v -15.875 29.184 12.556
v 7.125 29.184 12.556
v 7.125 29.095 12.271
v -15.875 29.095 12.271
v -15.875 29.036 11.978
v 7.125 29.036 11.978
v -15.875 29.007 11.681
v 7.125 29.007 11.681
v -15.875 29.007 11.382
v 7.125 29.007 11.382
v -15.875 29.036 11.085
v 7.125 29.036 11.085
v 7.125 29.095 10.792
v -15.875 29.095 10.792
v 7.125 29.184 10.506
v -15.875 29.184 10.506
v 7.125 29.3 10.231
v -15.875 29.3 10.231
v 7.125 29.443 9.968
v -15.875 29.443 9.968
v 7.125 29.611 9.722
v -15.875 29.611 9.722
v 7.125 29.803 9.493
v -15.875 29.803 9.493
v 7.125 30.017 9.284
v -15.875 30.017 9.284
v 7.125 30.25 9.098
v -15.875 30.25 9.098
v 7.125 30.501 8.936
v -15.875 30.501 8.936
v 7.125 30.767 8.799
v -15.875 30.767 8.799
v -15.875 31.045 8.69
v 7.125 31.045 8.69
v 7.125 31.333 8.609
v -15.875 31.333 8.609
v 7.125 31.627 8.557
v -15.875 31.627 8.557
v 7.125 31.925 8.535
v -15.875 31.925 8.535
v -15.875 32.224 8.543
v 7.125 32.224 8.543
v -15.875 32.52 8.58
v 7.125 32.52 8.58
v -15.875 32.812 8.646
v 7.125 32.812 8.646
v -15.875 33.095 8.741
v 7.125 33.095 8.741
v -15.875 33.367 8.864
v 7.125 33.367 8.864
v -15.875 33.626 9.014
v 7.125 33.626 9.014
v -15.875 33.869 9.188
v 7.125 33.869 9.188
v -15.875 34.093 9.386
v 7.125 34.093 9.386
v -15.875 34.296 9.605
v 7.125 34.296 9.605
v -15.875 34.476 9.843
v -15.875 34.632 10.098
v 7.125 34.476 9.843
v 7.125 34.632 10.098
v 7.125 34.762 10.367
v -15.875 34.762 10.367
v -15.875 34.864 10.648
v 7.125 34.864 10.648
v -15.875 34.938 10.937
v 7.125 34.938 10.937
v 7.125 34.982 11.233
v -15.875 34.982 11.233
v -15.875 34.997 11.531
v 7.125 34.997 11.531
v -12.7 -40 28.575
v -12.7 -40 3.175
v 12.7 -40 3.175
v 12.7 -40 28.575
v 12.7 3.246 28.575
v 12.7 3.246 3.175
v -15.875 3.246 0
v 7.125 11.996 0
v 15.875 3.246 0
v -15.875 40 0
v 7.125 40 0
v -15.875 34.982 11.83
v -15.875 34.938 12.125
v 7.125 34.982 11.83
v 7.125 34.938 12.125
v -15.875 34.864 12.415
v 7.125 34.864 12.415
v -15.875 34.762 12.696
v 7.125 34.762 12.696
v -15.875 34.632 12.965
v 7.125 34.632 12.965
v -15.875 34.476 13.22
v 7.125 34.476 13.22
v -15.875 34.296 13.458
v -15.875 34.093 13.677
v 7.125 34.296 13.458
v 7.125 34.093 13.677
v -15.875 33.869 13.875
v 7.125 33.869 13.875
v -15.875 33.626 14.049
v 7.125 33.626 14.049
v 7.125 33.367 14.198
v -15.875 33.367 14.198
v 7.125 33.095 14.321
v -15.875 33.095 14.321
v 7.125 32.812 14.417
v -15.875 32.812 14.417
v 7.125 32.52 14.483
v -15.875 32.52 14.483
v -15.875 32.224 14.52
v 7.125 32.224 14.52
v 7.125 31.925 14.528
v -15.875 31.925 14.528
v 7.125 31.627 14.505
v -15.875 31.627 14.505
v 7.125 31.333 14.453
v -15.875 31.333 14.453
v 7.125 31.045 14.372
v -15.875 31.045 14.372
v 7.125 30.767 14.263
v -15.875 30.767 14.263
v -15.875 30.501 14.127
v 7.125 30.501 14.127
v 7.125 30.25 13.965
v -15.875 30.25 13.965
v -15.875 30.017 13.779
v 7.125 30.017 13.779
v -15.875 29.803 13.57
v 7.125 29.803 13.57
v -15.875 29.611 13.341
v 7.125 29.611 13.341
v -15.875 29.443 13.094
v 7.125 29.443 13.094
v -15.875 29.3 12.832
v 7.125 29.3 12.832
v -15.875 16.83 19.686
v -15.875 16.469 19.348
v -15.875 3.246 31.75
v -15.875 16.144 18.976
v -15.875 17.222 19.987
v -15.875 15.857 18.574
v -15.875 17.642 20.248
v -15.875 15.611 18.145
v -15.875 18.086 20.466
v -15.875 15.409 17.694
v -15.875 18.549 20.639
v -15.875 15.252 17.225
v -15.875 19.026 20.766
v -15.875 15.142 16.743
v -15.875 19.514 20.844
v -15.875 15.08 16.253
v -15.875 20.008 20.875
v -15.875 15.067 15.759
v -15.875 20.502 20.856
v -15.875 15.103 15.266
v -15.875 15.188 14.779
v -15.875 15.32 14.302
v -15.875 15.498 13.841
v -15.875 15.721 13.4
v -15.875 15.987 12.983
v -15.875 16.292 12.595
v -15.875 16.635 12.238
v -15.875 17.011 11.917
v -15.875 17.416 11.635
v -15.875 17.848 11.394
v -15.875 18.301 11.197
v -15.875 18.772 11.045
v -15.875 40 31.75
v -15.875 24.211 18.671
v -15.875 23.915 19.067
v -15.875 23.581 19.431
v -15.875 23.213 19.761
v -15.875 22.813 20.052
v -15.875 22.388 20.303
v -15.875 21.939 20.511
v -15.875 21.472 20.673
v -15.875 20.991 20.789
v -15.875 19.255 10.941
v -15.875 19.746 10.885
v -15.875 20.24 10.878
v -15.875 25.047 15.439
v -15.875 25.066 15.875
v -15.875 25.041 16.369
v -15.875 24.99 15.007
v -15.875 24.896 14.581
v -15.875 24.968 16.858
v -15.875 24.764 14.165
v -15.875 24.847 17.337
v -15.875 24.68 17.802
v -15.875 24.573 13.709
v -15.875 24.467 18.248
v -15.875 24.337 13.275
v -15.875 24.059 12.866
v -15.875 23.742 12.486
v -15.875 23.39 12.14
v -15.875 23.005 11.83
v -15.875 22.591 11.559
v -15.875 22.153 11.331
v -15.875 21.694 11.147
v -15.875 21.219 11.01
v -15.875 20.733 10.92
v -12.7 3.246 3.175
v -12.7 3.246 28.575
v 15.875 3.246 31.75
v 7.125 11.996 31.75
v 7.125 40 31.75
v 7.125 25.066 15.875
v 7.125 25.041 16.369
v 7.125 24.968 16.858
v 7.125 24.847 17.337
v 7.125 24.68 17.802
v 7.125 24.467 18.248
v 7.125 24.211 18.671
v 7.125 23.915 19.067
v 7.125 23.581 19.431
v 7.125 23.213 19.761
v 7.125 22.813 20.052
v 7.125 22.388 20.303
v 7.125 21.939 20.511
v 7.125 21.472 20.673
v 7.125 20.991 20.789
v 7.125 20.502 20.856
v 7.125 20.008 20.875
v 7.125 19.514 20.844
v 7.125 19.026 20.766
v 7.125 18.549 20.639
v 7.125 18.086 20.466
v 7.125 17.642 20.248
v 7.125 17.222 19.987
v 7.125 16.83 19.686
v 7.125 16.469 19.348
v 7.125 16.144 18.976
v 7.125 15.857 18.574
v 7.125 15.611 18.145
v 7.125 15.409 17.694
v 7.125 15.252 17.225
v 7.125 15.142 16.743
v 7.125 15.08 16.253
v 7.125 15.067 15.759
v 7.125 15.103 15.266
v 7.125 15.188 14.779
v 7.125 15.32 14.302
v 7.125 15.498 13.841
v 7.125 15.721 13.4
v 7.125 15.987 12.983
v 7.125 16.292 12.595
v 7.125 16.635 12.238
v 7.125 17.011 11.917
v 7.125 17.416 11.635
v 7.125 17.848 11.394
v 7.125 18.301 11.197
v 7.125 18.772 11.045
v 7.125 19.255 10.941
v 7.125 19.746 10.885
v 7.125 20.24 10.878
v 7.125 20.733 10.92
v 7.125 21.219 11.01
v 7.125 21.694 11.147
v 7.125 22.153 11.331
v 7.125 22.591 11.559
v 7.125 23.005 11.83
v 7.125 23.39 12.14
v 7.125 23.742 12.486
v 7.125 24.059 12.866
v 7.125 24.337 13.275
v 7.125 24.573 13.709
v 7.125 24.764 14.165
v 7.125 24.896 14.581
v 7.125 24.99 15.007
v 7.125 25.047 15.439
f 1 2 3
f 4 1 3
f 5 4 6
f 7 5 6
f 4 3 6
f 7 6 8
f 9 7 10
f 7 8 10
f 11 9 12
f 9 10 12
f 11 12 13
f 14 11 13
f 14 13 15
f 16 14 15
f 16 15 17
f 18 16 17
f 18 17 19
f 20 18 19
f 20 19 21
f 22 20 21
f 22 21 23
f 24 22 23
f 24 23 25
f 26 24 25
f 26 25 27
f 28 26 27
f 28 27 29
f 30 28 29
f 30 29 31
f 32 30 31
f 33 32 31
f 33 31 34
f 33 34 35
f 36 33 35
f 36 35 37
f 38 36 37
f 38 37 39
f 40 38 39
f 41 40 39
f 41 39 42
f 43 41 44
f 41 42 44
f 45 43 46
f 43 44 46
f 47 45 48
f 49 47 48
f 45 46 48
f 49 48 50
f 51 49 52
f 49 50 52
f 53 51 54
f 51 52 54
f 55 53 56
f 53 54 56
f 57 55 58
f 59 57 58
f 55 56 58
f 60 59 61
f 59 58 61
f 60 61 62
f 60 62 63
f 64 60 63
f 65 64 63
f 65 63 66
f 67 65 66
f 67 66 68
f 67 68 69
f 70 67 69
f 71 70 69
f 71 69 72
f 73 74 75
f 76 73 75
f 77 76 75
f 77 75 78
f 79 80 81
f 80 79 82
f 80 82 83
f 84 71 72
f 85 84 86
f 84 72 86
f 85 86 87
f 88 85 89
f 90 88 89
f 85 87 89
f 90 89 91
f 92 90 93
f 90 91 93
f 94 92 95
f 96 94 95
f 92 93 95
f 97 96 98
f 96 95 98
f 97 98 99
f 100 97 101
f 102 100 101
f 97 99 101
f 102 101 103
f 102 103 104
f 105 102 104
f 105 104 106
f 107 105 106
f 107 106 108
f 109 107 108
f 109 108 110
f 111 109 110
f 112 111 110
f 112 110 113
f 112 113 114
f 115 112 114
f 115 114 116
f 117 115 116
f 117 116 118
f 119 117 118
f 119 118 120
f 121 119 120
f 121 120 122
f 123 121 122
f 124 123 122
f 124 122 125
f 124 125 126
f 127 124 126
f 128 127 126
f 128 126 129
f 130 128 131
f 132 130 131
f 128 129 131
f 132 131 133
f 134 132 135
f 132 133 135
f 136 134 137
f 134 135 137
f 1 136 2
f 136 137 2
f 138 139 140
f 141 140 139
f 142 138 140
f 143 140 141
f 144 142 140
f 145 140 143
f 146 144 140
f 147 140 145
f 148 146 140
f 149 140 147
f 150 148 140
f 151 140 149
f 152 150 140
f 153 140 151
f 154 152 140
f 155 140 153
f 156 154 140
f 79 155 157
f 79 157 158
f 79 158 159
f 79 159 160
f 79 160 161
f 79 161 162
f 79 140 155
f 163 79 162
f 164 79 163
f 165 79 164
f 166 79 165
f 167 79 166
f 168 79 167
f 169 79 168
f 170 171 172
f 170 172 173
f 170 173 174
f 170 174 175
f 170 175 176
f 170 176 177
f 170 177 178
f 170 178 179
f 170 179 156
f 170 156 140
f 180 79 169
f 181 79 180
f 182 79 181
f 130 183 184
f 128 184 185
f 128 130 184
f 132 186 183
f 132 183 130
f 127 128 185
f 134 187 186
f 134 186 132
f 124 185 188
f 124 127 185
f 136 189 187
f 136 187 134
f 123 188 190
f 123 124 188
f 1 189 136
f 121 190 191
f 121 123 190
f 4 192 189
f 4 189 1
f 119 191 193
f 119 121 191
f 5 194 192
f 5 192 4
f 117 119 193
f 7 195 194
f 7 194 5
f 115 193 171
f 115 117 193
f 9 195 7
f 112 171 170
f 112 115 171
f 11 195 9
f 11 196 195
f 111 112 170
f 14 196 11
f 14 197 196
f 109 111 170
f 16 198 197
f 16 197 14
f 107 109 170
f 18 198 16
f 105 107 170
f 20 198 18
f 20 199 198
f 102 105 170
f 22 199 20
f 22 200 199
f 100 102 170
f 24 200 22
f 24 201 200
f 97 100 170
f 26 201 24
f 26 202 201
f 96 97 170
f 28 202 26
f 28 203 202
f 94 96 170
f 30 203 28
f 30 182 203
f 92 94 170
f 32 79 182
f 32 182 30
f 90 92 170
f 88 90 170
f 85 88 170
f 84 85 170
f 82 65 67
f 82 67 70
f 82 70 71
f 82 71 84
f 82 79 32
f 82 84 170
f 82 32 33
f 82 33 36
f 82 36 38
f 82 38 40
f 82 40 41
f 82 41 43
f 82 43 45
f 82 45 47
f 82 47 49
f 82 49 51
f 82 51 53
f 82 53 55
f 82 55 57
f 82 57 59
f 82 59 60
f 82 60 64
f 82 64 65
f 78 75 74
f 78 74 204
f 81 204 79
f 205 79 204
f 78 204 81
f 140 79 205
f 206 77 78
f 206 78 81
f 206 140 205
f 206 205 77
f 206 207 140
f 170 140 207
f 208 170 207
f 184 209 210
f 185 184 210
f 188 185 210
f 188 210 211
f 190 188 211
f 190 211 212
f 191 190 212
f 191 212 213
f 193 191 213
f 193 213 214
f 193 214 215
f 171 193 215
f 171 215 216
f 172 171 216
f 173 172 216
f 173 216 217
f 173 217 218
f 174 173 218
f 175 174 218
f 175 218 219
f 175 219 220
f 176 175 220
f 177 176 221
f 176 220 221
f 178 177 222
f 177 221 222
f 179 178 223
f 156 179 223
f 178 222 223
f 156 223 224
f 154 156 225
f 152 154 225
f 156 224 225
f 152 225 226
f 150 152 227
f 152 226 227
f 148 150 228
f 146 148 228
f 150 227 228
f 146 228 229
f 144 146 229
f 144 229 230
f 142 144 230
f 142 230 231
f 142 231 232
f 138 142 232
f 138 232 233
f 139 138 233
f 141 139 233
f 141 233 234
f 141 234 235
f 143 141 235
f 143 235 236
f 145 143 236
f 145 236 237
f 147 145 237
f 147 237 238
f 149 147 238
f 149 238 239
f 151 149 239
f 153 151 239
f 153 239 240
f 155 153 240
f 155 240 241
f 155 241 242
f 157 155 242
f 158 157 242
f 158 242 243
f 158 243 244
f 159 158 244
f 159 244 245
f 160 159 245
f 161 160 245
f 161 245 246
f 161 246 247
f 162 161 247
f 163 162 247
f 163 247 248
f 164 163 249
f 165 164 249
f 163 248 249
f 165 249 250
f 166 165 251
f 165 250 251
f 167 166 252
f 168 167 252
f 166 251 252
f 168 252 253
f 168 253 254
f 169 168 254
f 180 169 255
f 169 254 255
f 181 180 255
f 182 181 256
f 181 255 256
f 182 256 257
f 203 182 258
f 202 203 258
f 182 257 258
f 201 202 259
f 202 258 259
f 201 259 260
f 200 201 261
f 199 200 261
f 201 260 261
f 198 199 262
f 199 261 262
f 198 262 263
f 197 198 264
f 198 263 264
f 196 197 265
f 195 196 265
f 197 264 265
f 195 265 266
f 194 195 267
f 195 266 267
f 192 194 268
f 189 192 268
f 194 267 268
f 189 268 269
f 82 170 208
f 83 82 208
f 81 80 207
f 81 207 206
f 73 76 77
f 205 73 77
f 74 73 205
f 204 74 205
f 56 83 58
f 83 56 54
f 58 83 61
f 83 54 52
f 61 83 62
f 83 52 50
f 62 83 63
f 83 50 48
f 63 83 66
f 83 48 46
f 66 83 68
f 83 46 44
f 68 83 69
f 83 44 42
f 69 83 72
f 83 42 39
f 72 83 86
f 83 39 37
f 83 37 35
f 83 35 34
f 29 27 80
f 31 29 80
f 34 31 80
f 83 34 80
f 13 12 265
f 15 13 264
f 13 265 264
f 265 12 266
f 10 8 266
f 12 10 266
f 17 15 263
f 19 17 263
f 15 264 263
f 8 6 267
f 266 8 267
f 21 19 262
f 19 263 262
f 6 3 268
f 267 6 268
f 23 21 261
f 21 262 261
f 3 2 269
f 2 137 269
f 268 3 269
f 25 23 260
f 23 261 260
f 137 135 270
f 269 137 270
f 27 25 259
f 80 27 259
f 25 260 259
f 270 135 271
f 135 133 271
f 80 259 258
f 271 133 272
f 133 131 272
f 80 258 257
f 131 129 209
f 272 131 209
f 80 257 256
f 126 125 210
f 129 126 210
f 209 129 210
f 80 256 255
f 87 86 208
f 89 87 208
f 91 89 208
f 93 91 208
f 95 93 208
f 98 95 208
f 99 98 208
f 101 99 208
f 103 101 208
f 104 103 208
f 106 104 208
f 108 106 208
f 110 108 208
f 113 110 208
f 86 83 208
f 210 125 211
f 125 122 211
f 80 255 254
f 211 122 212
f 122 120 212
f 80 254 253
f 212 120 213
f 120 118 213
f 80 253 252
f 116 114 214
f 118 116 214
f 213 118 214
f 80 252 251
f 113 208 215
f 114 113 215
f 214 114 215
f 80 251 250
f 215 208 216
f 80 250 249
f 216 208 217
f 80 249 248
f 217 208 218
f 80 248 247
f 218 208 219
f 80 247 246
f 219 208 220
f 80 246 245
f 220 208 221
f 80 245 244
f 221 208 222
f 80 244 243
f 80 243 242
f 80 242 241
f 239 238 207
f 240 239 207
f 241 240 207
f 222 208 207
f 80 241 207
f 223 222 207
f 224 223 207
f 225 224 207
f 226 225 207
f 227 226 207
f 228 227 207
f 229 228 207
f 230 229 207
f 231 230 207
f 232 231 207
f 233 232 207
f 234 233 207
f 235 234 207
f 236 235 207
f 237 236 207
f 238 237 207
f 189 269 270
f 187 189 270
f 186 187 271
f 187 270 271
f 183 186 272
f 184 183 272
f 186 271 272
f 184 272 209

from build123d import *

# Parameters (mm, degrees)
F0_W     = 31.75
F0_H     = 80
F1_DEPTH = 31.75
F3_DEPTH = 31.751
F4_W     = 25.4
F4_H     = 10
F4_W_2   = 3.175
F4_H_2   = 43.2458060166
F5_DEPTH = 31.751
F6_W     = 47.7026679298
F6_H     = 12.140064659
F6_H_2   = 10.4135097936
F7_DEPTH = 31.751
F9_DEPTH = 31.751


with BuildPart() as f1:
    # F0 (on Top) → F1 (new body)
    with BuildSketch(Plane.XY):
        Rectangle(F0_W, F0_H)
    extrude(amount=F1_DEPTH)

    # F2 (on face) → F3 (cut, through all)
    with BuildSketch(Plane.YZ.offset(15.875)):
        with BuildLine():
            Line((20.065903716, 15.875), (25.065903716, 15.875))
            ThreePointArc((25.065903716, 15.875), (15.141864951, 16.7432408883), (24.7643668199, 14.1648992834))
            Line((24.7643668199, 14.1648992834), (20.065903716, 15.875))
        make_face()
        with BuildLine():
            ThreePointArc((34.9972, 11.5313441798), (32.5204583181, 14.4830099771), (29.183553277, 12.5564469533))
            ThreePointArc((29.183553277, 12.5564469533), (31.4795416819, 8.5796783824), (34.9972, 11.5313441798))
        make_face()
        with BuildLine():
            ThreePointArc((24.7643668199, 14.1648992834), (24.9899424811, 15.0067591117), (25.065903716, 15.875))
            Line((25.065903716, 15.875), (20.065903716, 15.875))
            Line((20.065903716, 15.875), (24.7643668199, 14.1648992834))
        make_face()
    extrude(amount=-F3_DEPTH, mode=Mode.SUBTRACT)

    # F4 (on face) → F5 (cut, through all)
    with BuildSketch(Plane.XY.offset(31.75)):
        with Locations((0, -45)):
            Rectangle(F4_W, F4_H)
        with Locations((14.2875, -18.3770969917)):
            Rectangle(F4_W_2, F4_H_2)
        with Locations((-14.2875, -18.3770969917)):
            Rectangle(F4_W_2, F4_H_2)
    extrude(amount=-F5_DEPTH, mode=Mode.SUBTRACT)

    # F6 (on face) → F7 (cut, through all)
    with BuildSketch(Plane.YZ.offset(15.875)):
        with Locations((-20.6055279483, 34.6450323295)):
            Rectangle(F6_W, F6_H)
        with Locations((-20.6055279483, -2.0317548968)):
            Rectangle(F6_W, F6_H_2)
    extrude(amount=-F7_DEPTH, mode=Mode.SUBTRACT)

    # F8 (on face) → F9 (cut, through all)
    with BuildSketch(Plane.XY.offset(31.75)):
        Polygon((15.875, 3.2458060166), (15.875, 40), (7.125, 40), (7.125, 11.9958060166), align=None)
    extrude(amount=-F9_DEPTH, mode=Mode.SUBTRACT)


solid = f1.part
